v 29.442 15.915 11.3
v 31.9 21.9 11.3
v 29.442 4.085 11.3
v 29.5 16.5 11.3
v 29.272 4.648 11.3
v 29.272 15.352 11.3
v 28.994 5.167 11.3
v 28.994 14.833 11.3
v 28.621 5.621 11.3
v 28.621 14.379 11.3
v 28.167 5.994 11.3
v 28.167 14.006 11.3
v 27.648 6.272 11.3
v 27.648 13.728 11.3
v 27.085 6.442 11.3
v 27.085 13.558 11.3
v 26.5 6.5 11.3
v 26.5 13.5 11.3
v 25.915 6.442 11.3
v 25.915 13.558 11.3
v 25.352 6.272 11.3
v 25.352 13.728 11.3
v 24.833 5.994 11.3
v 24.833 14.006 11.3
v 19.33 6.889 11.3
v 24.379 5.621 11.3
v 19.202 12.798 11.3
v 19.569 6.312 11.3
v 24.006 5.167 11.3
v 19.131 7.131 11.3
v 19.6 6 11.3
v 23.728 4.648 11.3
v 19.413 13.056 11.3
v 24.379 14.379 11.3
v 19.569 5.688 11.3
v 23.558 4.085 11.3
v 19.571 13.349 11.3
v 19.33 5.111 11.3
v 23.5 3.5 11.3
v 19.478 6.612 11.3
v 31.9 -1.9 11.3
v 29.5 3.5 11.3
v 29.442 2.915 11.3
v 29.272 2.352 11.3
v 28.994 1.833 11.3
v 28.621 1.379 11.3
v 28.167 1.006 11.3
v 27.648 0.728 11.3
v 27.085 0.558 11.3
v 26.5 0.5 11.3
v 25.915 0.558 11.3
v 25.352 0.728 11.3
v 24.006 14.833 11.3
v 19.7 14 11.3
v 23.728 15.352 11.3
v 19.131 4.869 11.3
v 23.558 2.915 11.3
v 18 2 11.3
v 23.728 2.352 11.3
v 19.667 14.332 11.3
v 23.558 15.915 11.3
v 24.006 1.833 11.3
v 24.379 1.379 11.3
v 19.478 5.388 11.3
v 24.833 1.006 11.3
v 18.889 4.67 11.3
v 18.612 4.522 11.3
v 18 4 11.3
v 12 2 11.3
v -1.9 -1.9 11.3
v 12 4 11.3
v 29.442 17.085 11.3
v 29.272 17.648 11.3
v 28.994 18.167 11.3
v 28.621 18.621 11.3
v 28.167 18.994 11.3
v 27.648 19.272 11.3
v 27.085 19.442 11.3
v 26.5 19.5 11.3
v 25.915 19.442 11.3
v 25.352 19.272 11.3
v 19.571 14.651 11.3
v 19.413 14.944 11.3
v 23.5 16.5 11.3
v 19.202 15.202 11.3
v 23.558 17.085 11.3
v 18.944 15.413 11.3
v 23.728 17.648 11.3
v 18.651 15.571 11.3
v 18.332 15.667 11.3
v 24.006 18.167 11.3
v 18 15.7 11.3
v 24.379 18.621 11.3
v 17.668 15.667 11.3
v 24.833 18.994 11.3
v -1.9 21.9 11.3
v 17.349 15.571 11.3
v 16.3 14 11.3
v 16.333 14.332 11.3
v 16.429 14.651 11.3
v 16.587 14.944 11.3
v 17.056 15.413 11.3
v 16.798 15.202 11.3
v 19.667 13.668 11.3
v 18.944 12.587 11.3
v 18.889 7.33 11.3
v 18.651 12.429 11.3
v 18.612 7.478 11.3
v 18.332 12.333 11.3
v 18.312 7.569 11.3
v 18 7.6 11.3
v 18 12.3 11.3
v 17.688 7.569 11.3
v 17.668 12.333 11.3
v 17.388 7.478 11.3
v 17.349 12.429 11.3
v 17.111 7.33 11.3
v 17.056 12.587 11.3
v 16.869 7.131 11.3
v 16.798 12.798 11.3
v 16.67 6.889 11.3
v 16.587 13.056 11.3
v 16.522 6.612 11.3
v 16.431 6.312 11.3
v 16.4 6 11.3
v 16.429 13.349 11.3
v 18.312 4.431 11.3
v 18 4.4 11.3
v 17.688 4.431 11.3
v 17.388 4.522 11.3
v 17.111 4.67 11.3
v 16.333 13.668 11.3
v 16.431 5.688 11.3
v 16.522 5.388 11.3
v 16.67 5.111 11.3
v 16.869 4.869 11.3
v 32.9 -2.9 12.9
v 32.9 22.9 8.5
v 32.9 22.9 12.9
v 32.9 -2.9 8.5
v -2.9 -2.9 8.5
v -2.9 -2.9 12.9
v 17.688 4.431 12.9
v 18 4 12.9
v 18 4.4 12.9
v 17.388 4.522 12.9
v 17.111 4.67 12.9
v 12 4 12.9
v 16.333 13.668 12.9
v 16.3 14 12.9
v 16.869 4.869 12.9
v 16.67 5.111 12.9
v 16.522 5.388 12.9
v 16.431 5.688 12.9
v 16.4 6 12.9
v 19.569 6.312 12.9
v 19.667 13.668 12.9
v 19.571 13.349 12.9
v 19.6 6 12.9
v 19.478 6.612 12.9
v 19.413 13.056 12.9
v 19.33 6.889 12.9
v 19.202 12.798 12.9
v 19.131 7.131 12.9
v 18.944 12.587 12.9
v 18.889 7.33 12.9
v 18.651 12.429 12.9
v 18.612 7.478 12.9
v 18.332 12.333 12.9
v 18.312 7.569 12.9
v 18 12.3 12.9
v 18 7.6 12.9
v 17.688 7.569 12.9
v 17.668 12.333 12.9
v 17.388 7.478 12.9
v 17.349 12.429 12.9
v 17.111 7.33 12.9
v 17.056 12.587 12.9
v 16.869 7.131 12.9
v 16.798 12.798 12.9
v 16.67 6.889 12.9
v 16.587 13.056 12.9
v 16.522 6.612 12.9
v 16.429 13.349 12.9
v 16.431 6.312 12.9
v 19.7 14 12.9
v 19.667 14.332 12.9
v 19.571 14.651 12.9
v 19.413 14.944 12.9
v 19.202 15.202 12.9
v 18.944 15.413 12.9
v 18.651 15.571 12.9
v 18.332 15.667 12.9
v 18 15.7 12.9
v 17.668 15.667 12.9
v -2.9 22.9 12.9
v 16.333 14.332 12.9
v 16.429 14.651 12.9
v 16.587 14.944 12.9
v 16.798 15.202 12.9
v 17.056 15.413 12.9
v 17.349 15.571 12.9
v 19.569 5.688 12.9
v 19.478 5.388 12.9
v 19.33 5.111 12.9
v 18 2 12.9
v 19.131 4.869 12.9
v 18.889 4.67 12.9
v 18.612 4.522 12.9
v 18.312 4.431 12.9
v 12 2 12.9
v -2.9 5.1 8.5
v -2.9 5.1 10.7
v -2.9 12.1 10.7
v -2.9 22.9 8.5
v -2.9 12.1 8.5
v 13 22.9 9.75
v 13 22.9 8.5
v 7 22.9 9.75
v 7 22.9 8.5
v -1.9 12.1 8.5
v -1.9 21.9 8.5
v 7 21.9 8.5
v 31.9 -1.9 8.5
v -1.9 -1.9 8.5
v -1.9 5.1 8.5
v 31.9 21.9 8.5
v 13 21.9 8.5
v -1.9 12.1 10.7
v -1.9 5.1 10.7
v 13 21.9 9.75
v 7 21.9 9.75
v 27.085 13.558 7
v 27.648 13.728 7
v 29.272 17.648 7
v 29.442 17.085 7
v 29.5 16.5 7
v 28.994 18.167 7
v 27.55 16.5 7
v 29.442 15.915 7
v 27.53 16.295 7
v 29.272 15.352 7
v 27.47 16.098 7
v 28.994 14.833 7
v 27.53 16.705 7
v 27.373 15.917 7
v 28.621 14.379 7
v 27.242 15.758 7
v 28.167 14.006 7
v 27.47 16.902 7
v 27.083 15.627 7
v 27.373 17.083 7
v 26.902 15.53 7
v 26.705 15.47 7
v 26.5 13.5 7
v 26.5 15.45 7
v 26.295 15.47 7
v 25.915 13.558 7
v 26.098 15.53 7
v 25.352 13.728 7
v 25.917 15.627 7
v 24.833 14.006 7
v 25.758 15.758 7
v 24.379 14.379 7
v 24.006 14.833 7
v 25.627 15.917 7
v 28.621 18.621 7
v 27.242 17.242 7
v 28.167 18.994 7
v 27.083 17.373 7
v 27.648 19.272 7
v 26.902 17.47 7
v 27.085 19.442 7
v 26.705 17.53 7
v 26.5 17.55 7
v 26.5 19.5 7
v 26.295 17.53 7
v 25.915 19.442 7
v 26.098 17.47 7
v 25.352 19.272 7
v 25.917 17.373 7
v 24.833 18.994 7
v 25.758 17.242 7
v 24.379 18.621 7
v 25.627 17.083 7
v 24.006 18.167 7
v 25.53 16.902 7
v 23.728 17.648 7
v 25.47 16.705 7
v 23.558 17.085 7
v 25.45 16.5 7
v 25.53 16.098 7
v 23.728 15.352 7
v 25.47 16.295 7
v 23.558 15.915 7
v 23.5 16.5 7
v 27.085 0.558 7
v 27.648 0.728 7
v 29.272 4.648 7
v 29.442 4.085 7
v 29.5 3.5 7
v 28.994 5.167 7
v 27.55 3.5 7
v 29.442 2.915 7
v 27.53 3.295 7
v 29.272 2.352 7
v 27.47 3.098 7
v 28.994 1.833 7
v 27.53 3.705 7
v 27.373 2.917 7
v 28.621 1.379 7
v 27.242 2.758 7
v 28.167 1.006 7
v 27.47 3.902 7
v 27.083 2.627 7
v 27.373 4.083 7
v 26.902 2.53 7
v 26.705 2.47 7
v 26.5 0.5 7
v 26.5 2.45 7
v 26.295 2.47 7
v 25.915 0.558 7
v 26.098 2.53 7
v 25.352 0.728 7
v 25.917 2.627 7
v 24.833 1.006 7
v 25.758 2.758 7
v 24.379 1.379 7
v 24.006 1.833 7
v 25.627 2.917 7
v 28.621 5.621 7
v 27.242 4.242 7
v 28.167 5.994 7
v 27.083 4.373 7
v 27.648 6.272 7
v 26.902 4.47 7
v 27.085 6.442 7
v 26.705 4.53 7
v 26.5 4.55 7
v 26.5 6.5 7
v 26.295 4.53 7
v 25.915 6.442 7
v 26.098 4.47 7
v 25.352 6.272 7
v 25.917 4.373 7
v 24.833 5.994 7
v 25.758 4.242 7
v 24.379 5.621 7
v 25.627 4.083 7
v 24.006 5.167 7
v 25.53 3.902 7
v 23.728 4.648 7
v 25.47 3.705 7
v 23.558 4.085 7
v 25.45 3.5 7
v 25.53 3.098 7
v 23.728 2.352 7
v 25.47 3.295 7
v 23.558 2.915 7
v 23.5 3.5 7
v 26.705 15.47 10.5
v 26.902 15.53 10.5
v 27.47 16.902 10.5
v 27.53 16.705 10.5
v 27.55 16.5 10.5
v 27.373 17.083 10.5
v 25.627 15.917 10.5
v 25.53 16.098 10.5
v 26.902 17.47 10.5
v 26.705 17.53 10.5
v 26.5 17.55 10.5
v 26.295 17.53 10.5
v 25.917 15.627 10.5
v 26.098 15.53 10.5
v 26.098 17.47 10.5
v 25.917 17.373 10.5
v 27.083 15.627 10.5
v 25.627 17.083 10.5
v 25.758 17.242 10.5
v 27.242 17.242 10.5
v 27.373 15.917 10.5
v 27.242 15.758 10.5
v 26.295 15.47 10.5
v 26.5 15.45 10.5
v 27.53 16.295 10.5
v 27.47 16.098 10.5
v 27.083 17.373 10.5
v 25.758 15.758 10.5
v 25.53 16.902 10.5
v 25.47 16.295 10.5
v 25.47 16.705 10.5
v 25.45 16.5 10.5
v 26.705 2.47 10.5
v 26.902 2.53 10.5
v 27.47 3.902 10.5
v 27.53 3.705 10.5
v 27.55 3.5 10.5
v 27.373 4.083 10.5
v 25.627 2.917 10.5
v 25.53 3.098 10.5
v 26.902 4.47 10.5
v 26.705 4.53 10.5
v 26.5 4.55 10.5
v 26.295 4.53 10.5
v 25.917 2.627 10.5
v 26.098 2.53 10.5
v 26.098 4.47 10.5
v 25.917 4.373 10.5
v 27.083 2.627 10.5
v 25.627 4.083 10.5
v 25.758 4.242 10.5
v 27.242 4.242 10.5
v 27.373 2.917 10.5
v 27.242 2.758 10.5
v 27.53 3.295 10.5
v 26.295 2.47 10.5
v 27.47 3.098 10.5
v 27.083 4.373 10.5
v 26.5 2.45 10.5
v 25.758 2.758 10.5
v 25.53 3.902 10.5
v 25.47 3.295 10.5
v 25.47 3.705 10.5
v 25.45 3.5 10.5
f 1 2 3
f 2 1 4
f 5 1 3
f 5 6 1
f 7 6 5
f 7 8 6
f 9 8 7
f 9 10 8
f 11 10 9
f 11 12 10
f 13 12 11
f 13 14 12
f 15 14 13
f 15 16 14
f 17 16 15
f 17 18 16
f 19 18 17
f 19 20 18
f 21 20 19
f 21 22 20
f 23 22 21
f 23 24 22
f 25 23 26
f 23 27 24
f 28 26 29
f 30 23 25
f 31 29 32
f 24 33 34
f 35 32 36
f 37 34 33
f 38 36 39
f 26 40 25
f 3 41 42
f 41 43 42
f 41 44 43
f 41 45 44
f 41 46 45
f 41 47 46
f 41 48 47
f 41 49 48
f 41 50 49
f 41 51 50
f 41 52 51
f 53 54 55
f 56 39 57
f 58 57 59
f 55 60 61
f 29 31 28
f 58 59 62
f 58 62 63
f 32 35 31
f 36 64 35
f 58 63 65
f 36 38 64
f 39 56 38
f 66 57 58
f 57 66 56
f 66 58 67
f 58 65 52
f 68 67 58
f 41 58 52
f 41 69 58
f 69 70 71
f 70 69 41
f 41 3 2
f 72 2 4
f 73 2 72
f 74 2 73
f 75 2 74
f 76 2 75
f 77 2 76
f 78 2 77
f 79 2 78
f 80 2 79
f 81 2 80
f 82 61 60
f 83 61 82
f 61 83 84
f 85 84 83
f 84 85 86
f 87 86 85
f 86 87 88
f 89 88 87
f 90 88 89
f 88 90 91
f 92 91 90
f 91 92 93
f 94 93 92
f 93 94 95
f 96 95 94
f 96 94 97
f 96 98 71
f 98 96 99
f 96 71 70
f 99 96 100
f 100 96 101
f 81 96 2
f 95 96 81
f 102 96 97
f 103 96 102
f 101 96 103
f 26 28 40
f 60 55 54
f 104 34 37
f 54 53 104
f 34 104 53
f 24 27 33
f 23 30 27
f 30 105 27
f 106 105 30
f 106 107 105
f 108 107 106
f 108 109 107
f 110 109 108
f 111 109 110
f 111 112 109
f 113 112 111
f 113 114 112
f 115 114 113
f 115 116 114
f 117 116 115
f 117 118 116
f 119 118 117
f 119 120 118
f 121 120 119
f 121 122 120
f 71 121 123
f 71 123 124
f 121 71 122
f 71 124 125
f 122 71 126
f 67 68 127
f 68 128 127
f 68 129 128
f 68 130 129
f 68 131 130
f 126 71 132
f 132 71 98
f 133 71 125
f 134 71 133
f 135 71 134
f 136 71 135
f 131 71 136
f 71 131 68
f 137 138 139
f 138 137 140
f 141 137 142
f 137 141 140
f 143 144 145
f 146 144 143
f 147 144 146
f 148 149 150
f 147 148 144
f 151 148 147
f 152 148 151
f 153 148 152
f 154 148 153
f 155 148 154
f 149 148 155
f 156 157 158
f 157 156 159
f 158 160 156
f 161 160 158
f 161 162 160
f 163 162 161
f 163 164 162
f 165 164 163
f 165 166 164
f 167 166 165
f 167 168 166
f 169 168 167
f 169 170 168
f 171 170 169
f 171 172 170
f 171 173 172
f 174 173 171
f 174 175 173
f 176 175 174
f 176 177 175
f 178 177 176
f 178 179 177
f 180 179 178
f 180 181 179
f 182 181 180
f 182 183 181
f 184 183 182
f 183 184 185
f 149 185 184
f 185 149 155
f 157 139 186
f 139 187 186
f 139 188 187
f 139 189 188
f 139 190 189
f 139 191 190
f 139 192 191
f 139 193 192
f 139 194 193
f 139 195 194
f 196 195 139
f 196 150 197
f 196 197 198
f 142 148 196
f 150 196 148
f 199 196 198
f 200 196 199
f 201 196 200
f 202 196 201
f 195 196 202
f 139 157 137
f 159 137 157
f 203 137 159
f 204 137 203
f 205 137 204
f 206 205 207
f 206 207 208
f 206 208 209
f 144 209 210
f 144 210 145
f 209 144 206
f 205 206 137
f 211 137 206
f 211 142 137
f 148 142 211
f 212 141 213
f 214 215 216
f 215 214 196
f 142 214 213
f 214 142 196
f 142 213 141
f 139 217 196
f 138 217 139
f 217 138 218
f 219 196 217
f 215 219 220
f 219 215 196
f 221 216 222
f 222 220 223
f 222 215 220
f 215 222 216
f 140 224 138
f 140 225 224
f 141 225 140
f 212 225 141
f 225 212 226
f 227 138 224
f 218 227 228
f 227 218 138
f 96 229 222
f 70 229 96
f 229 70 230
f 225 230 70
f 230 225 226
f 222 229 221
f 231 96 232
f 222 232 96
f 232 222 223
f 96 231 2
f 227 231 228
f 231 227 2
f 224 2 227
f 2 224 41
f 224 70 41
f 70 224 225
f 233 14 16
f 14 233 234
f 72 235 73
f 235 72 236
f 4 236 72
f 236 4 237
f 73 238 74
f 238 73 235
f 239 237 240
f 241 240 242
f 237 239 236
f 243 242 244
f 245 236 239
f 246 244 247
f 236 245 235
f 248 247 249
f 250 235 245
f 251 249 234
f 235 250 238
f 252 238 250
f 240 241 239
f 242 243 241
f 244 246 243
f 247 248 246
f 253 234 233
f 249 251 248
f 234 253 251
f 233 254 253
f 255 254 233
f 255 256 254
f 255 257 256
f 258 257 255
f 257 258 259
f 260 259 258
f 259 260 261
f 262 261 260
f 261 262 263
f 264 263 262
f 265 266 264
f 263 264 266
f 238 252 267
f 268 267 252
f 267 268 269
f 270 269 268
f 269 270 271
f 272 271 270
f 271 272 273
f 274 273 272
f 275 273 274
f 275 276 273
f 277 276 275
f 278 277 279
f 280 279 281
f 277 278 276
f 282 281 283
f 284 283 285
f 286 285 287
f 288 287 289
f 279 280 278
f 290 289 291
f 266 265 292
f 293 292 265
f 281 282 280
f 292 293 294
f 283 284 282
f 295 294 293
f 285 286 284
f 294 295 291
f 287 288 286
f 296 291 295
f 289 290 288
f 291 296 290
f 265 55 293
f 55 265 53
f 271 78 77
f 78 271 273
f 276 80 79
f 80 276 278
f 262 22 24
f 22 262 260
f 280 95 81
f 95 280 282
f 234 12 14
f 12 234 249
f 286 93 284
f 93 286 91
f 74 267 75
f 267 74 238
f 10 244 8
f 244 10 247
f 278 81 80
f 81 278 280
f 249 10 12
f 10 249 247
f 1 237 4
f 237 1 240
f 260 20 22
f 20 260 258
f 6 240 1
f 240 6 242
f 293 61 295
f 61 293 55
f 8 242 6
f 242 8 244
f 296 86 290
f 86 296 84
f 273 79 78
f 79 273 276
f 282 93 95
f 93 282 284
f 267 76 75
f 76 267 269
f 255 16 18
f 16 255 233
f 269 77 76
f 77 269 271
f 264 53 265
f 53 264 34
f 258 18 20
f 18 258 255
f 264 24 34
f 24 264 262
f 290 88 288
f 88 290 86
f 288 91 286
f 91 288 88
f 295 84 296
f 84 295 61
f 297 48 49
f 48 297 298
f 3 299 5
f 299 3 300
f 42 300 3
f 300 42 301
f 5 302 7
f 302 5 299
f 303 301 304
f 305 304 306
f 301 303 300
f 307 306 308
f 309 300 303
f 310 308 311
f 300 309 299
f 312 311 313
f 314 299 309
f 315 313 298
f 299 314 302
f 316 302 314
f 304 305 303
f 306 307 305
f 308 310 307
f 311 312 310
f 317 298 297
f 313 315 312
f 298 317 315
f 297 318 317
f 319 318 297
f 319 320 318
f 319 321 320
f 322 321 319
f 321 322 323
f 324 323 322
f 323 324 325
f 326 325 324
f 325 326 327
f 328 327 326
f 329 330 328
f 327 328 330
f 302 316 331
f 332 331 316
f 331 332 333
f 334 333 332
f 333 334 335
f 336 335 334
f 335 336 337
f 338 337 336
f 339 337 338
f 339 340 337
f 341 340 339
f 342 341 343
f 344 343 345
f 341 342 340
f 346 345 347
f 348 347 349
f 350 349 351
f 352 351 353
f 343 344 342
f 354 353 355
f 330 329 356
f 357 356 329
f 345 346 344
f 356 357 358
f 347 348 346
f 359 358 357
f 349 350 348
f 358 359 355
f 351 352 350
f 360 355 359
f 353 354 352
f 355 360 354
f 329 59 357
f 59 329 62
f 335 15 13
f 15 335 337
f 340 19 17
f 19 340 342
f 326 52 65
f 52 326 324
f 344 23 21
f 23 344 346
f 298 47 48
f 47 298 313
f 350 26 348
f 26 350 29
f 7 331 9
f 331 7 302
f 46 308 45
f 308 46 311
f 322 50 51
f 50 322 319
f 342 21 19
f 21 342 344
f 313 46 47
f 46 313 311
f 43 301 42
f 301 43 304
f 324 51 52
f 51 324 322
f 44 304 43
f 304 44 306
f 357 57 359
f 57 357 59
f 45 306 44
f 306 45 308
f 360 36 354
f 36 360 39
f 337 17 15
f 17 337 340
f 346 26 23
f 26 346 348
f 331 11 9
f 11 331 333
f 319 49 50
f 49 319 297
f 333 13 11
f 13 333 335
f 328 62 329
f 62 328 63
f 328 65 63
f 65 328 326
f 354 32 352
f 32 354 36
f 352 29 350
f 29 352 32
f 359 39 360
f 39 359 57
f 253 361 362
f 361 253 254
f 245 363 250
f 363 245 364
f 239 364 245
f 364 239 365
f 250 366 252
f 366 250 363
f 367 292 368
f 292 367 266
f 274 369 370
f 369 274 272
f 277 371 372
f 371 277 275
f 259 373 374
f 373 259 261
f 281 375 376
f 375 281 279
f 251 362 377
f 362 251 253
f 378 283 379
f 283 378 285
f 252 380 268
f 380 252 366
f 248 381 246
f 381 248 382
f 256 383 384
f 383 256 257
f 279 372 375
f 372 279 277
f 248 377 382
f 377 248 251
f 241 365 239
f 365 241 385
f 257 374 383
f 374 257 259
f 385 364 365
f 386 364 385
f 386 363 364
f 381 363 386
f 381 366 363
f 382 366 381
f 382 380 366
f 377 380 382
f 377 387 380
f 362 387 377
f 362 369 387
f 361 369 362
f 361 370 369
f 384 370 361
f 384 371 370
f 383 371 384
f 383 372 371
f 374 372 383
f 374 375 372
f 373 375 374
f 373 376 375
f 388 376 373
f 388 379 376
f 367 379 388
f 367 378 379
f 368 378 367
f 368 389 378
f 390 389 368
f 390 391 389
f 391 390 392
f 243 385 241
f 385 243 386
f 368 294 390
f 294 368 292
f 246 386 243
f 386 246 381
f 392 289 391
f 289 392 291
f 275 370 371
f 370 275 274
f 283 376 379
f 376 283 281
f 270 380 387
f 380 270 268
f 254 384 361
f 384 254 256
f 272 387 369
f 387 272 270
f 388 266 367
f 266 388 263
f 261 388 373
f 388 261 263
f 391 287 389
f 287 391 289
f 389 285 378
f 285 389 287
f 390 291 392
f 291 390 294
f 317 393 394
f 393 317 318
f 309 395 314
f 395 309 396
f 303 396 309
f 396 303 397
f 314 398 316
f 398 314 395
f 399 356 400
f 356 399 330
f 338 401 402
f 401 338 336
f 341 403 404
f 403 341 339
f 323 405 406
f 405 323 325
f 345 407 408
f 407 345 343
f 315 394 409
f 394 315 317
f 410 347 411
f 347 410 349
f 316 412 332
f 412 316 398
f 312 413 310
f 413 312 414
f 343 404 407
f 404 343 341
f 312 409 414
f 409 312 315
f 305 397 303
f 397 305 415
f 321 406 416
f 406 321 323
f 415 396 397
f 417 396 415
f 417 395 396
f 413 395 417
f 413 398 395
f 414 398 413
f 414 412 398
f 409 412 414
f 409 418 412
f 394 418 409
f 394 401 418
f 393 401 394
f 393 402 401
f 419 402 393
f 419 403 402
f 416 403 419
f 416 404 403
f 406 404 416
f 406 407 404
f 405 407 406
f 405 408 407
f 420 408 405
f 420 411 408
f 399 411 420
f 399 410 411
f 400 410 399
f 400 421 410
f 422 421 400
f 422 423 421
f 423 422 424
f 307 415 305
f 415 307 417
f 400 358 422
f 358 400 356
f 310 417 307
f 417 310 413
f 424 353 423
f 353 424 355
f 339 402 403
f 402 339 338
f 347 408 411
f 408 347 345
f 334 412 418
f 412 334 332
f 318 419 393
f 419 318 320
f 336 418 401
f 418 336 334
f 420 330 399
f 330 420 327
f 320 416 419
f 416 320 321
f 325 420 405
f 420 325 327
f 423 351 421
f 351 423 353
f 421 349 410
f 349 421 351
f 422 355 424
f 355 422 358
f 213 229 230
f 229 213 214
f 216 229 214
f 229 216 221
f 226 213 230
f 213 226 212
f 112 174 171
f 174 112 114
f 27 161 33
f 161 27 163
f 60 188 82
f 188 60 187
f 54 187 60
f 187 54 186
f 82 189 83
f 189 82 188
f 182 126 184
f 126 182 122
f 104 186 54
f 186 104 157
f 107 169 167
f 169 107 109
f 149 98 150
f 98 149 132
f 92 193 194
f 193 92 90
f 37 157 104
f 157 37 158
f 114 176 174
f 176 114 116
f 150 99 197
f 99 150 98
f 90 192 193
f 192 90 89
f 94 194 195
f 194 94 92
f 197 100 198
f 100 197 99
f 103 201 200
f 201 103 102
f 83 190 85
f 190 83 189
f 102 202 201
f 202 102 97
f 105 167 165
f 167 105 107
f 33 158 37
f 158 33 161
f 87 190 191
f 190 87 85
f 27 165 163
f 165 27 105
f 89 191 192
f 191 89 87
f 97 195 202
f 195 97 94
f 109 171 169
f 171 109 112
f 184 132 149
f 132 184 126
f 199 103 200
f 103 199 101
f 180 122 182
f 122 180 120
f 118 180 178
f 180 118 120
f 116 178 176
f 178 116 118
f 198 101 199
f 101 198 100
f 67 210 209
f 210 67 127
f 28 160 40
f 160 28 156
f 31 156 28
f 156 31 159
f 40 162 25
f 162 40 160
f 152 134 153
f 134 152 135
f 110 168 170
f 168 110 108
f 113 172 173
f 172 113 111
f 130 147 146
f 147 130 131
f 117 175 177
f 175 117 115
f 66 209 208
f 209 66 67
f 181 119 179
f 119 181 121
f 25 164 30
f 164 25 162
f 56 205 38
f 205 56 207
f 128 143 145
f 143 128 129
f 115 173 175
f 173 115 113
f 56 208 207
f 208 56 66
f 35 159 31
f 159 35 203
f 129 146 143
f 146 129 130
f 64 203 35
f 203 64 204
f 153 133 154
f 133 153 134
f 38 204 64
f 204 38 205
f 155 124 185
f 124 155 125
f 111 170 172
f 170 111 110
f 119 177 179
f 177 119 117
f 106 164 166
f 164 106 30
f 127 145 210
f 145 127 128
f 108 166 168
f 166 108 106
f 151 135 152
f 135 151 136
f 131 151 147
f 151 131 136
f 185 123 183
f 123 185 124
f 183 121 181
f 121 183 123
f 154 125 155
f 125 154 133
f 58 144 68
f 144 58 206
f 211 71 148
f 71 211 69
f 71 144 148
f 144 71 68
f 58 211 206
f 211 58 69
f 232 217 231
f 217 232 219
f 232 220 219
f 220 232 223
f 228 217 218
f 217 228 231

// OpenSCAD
// The lid of the housing "usbc_parts", written by enclosure-nv 0.1.0
// from the board file usbc_board.kicad_pcb.  Render with OpenSCAD.
// Parameters, in millimetres.  The same block heads every file of this housing:
// when a value is changed, change it in each file.
wall = 2.4;
floor_t = 2.4;
lid_t = 1.6;
clear = 0.5;  // the board's edge to the inside of the wall
standoff_d = 6;
screw_d = 2.5;
pilot_d = 2.1;
head_d = 5;
head_h = 1.6;
lip_h = 3;  // the height of the step the lid sits on
lid_gap = 0.2;
snap_depth = 0.4;
snap_h = 0.8;
led_d = 3;
button_d = 3;
board_t = 1.6;
standoff_h = 3;  // the space under the board
top_space = 4.3;  // the space above the board
pilot_len = 3.5;  // the depth of the screw's hole
print_flip = false;  // true lays the lid plate down

// Levels along z.
z_bb = floor_t + standoff_h;
z_bt = z_bb + board_t;
z_split = z_bt + top_space;
z_step = z_split - lip_h;
z_top = z_split + lid_t;
z_skirt = z_step + lid_gap;
a_in = wall / 2;
screw_clear = screw_d + 0.3;

module outline() {
  polygon(points = [[0, 0], [30, 0], [30, 20], [0, 20]]);
}

module lid() {
  difference() {
    union() {
      // the plate
      translate([0, 0, z_split]) linear_extrude(height = lid_t) offset(delta = clear + wall) outline();
      // the skirt that takes the place of the outer half of the wall
      translate([0, 0, z_skirt]) linear_extrude(height = z_split - z_skirt + 0.2) difference() {
        offset(delta = clear + wall) outline();
        offset(delta = clear + a_in + lid_gap) outline();
      }
      // the pillars the screws turn into
      translate([26.5, 16.5, z_bt]) cylinder(h = z_split - z_bt + 0.2, d = standoff_d, $fn = 32);
      translate([26.5, 3.5, z_bt]) cylinder(h = z_split - z_bt + 0.2, d = standoff_d, $fn = 32);
    }
    // the screws' holes
    translate([26.5, 16.5, z_bt - 1]) cylinder(h = pilot_len + 1, d = pilot_d, $fn = 32);
    translate([26.5, 3.5, z_bt - 1]) cylinder(h = pilot_len + 1, d = pilot_d, $fn = 32);
    // the openings
    translate([0, 8.6, z_bt + (-0.4)]) rotate([0, 0, 180]) translate([-1, -3.5, 0]) cube([clear + wall + 2, 7, 4.1]);
    translate([18, 14, z_split - 1]) cylinder(h = lid_t + 2, d = 3.4, $fn = 32);
    translate([18, 6, z_split - 1]) cylinder(h = lid_t + 2, d = 3.2, $fn = 32);
    translate([12, 2, z_split - 1]) cube([6, 2, lid_t + 2]);
    translate([10, 20, z_bt + (0.25)]) rotate([0, 0, 90]) translate([-1, -3, 0]) cube([clear + wall + 2, 6, 2.5]);
  }
}

if (print_flip) {
  translate([0, 20, z_top]) rotate([180, 0, 0]) lid();
} else {
  lid();
}
